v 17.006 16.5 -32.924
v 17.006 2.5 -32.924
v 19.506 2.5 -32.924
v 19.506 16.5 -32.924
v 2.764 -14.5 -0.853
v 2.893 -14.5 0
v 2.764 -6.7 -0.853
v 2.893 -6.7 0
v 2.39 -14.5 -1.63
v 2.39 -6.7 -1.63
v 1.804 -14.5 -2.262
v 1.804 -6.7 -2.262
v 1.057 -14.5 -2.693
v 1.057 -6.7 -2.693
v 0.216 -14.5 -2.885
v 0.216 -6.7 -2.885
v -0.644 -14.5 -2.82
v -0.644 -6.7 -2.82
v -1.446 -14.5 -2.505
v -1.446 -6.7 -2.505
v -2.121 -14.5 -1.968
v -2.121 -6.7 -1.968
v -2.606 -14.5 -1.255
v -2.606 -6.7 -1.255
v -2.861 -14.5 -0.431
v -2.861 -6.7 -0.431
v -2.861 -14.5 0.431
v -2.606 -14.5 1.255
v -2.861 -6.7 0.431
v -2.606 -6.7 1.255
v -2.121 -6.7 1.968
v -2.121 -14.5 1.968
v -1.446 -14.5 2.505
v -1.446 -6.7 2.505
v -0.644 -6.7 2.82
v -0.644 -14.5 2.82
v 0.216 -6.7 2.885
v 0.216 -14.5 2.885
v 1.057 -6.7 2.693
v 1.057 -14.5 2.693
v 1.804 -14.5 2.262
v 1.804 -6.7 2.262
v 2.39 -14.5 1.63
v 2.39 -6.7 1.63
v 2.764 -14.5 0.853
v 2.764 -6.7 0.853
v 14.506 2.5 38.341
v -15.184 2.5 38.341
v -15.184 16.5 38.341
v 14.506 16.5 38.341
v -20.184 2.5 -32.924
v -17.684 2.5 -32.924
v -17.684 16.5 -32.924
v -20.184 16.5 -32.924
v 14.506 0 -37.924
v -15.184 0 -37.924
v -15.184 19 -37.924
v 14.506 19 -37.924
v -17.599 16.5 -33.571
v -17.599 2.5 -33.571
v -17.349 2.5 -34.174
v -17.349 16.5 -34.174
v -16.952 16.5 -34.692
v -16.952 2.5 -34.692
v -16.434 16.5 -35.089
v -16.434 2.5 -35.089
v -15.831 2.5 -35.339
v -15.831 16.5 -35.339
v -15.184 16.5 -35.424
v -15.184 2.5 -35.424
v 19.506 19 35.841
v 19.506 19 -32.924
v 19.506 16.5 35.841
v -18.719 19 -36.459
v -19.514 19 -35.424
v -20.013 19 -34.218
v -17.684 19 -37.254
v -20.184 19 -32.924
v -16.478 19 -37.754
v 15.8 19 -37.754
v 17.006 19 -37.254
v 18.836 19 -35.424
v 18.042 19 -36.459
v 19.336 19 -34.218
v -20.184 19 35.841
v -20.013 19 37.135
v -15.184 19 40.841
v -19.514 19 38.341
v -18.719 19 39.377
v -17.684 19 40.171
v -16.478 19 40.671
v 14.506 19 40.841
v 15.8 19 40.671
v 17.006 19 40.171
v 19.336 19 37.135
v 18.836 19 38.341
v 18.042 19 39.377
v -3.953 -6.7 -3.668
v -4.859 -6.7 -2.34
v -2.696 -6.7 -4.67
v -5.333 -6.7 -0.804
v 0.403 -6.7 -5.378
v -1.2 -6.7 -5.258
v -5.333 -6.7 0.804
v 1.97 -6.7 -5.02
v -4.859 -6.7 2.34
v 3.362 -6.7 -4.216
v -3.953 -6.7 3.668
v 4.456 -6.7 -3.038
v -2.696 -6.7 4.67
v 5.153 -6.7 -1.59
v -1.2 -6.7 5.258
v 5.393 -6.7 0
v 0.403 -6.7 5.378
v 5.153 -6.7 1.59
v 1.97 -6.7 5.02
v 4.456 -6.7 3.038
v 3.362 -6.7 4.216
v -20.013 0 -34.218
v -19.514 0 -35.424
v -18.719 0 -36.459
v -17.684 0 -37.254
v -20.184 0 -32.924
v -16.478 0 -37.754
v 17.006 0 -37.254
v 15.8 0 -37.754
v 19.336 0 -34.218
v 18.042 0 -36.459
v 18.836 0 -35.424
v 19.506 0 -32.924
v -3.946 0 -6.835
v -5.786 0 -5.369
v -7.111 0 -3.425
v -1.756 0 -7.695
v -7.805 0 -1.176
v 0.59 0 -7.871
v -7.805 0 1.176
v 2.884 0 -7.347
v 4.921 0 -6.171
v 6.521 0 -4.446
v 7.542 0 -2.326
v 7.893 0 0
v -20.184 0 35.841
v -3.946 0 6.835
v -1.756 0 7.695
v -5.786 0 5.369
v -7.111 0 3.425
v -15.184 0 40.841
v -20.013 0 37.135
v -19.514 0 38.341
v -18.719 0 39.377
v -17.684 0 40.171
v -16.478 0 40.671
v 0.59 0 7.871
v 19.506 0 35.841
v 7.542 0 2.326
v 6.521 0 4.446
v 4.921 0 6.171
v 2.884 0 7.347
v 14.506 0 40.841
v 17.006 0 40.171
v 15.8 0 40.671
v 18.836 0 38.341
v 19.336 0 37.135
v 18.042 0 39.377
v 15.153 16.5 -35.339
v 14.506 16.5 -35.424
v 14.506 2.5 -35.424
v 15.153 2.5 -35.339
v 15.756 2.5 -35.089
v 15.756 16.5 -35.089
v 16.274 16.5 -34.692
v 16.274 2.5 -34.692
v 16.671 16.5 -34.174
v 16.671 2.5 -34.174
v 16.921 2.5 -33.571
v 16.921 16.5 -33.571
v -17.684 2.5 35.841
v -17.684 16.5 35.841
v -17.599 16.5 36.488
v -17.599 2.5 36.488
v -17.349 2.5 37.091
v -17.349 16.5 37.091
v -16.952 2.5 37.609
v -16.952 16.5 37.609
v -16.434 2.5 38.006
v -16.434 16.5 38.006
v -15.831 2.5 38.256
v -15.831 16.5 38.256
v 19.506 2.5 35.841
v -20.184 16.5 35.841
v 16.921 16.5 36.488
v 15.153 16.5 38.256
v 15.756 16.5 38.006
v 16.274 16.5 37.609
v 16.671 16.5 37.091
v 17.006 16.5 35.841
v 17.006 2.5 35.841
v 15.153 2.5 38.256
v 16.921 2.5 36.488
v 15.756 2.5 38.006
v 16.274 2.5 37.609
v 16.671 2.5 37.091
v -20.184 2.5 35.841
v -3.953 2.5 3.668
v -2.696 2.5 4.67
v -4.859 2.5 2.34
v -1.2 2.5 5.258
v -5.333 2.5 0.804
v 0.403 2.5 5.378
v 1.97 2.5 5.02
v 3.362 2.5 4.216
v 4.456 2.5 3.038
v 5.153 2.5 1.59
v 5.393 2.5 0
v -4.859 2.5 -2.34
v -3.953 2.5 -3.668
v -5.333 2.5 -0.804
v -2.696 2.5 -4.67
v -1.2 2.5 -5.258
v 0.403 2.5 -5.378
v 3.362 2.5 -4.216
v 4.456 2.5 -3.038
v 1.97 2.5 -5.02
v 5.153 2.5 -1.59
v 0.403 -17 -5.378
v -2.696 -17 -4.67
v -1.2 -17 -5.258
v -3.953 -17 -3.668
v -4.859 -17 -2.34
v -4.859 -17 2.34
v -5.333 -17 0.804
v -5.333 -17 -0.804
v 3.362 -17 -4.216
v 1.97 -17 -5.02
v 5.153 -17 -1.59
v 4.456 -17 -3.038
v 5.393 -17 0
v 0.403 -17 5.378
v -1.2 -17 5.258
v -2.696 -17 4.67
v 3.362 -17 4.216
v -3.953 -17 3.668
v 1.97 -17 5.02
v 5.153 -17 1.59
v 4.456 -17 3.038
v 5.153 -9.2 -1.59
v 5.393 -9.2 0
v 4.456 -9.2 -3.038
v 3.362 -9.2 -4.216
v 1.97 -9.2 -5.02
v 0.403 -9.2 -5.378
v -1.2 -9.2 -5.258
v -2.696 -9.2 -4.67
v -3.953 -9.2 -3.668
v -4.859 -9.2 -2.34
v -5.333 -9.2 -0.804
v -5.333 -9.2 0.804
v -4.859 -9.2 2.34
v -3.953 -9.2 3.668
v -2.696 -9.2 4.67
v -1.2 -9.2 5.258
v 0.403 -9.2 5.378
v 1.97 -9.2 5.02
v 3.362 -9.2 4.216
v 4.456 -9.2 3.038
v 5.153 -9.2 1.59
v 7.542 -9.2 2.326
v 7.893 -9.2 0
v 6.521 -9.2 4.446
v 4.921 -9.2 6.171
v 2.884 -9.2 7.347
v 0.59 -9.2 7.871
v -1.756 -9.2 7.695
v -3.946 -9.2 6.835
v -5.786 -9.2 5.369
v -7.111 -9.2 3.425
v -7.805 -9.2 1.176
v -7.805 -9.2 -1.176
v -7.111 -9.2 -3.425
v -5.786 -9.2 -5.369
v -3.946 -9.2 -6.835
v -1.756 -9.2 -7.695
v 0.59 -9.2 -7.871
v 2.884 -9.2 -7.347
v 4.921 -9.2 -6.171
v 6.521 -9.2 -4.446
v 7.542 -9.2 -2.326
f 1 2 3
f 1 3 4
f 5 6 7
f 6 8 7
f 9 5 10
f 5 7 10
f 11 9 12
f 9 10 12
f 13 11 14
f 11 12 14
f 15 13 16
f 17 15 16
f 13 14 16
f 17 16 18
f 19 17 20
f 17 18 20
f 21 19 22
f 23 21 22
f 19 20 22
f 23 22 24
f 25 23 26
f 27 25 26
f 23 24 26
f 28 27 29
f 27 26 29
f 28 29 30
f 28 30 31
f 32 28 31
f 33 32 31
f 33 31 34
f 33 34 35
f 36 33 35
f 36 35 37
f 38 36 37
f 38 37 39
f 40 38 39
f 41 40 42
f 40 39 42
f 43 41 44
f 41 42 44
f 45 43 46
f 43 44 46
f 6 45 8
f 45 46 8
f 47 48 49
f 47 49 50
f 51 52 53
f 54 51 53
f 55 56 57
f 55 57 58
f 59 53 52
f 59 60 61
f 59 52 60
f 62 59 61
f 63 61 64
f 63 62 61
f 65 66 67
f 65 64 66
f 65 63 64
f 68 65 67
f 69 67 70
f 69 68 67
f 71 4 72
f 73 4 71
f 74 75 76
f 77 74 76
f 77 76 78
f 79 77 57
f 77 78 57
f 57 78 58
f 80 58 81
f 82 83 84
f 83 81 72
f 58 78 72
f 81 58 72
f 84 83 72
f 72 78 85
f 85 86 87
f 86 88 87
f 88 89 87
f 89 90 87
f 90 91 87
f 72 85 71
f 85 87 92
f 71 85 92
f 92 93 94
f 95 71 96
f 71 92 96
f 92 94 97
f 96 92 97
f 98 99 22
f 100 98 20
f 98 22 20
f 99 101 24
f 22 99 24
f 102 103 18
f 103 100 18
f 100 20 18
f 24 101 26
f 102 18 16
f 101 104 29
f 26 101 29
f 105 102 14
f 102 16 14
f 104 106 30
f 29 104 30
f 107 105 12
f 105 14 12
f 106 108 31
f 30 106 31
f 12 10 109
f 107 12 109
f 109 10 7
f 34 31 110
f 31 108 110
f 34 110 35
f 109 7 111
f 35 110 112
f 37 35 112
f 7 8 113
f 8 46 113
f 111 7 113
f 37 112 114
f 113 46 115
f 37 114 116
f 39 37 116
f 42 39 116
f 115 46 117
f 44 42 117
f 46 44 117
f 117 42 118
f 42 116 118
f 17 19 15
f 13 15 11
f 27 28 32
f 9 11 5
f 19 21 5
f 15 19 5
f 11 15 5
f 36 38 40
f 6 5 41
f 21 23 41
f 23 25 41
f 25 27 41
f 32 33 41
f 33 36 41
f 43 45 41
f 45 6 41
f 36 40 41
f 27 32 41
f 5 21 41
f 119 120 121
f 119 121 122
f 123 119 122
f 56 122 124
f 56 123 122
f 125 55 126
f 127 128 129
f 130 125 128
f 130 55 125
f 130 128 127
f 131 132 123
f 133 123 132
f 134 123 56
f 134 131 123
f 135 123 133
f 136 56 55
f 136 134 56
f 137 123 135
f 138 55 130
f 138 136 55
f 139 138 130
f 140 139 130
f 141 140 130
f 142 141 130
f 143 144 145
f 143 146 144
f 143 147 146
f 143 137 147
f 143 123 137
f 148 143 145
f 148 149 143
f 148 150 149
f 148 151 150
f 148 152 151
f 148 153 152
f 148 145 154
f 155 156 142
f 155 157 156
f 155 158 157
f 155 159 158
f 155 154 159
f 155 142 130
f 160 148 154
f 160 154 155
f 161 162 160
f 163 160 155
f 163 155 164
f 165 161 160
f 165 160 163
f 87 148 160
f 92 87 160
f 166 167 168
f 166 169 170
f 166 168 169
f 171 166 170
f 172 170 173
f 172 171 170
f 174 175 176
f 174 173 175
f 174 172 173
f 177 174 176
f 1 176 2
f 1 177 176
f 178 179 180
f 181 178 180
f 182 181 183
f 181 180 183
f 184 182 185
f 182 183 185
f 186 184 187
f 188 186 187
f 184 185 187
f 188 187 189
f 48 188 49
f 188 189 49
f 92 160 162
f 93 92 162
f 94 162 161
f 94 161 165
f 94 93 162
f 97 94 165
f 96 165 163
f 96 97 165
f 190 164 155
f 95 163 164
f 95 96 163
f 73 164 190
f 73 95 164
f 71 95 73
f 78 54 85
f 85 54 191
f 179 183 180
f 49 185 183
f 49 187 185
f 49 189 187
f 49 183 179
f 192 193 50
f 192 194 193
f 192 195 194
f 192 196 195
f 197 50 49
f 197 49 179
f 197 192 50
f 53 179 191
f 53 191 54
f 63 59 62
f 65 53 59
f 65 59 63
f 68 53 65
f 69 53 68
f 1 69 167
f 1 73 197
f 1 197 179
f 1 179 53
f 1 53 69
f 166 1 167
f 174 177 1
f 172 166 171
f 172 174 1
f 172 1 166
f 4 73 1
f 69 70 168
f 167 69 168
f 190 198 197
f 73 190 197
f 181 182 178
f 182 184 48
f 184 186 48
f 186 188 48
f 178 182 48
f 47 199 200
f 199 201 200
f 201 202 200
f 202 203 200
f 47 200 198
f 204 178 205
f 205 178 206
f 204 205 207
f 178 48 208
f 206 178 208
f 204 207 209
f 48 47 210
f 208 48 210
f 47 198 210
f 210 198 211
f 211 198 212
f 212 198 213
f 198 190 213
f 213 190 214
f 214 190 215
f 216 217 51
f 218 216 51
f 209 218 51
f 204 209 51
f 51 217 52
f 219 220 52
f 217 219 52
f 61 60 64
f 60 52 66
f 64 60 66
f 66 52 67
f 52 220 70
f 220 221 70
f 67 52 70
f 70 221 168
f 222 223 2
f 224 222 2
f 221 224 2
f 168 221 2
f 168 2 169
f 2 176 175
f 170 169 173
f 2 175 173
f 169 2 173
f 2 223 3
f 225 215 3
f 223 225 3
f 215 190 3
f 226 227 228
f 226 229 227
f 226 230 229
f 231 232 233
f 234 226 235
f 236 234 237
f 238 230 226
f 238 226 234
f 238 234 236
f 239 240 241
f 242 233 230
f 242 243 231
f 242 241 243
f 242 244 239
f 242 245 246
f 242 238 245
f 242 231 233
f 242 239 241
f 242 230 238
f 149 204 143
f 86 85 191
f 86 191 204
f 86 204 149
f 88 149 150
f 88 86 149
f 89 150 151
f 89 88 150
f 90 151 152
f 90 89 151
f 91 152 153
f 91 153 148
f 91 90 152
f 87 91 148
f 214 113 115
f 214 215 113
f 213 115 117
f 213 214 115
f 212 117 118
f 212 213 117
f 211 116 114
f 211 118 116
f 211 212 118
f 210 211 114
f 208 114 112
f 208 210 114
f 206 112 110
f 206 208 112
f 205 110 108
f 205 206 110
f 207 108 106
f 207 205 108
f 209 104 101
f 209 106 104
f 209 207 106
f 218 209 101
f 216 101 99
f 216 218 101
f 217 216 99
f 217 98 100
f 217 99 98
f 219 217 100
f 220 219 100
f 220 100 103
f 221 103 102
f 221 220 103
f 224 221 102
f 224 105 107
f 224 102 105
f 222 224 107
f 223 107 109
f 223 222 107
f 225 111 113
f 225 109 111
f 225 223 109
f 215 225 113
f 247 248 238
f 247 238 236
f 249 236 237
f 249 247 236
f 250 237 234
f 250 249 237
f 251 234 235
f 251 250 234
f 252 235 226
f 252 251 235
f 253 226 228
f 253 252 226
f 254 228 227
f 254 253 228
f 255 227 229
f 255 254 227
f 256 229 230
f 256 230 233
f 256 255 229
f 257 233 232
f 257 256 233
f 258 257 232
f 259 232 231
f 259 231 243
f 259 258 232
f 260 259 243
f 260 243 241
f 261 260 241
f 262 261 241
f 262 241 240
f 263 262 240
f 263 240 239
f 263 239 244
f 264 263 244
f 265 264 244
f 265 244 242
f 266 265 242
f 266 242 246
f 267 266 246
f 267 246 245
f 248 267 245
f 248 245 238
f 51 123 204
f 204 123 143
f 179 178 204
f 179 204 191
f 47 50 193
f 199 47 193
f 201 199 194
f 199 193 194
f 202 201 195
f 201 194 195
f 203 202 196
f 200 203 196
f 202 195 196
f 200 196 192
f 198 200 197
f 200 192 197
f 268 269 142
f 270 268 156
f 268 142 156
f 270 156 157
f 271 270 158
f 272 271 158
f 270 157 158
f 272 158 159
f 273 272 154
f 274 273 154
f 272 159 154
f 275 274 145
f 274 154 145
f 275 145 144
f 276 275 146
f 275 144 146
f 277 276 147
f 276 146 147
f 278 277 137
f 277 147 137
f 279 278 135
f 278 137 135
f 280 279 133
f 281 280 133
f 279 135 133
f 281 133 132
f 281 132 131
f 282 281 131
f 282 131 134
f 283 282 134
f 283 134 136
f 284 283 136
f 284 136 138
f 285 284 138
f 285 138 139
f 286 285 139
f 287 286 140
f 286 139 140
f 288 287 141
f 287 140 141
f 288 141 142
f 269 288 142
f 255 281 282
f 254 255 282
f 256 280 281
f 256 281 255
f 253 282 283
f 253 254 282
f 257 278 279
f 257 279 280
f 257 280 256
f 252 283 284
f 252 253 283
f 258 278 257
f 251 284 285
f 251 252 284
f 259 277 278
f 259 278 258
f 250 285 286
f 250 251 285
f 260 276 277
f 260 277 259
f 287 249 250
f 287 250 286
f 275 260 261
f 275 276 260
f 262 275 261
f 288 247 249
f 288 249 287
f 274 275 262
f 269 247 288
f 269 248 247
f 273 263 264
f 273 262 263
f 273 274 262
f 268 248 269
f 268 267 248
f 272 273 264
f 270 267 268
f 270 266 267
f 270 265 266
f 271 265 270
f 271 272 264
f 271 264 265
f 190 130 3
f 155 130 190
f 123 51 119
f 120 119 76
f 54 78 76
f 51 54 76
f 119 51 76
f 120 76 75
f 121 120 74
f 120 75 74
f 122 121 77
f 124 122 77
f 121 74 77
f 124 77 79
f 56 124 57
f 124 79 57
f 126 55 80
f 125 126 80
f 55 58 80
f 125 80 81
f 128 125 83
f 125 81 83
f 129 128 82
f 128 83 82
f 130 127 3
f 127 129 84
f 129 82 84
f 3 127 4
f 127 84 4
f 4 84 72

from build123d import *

# Parameters (mm, degrees)
F0_R     = 7.8929339783
F1_DEPTH = 9.2
F2_T     = -2.5
F3_DEPTH = 14.5
F4_W     = 39.6901145577
F4_H     = 78.7652172148
F5_DEPTH = 19
F6_R     = 5
F7_T     = -2.5


# Not quite as in the source:
# - a shell that OpenCascade refuses in one call is made with other operations: the cavity is built on its own and cut out


with BuildPart() as f1:
    # F0 (on Front) → F1 (new body)
    with BuildSketch(Plane.XZ):
        Circle(F0_R)
    extrude(amount=F1_DEPTH)

    # F2
    f2_openings = [f1.faces().sort_by_distance(p)[0] for p in [
        (0, -9.2, 0),
    ]]
    offset(amount=F2_T, openings=f2_openings)

    # F3 (add): a face of the model
    f3_faces = [f1.faces().sort_by_distance(p)[0] for p in [
        (0, -2.5, 0),
    ]]
    extrude(f3_faces, amount=F3_DEPTH)

    # F4 (on Front) → F5 (join)
    with BuildSketch(Plane.XZ):
        with Locations((-0.3387015313, 1.4586504549)):
            Rectangle(F4_W, F4_H)
    extrude(amount=-F5_DEPTH)

    # F6
    f6_edges = [f1.edges().sort_by_distance(p)[0] for p in [
        (19.506356, 9.5, 40.841259),
        (19.506356, 9.5, -37.923958),
        (-20.183759, 9.5, 40.841259),
        (-20.183759, 9.5, -37.923958),
    ]]
    fillet(f6_edges, radius=F6_R)

    # F7: a shell. OpenCascade refuses it in one call, so the cavity is built on its own and cut out:
    # the body offset inwards by the wall thickness, plus a prism from it out through each open face.
    f7_core = offset(f1.part, amount=F7_T, kind=Kind.INTERSECTION, mode=Mode.PRIVATE)
    f7_exits = [f7_core.faces().sort_by_distance(p)[0] for p in [
        (17.006356, 9.5, 1.45865),
        (-17.683759, 9.5, 1.45865),
    ]]
    add(f7_core, mode=Mode.SUBTRACT)
    extrude(f7_exits, amount=-F7_T, mode=Mode.SUBTRACT)


solid = f1.part
